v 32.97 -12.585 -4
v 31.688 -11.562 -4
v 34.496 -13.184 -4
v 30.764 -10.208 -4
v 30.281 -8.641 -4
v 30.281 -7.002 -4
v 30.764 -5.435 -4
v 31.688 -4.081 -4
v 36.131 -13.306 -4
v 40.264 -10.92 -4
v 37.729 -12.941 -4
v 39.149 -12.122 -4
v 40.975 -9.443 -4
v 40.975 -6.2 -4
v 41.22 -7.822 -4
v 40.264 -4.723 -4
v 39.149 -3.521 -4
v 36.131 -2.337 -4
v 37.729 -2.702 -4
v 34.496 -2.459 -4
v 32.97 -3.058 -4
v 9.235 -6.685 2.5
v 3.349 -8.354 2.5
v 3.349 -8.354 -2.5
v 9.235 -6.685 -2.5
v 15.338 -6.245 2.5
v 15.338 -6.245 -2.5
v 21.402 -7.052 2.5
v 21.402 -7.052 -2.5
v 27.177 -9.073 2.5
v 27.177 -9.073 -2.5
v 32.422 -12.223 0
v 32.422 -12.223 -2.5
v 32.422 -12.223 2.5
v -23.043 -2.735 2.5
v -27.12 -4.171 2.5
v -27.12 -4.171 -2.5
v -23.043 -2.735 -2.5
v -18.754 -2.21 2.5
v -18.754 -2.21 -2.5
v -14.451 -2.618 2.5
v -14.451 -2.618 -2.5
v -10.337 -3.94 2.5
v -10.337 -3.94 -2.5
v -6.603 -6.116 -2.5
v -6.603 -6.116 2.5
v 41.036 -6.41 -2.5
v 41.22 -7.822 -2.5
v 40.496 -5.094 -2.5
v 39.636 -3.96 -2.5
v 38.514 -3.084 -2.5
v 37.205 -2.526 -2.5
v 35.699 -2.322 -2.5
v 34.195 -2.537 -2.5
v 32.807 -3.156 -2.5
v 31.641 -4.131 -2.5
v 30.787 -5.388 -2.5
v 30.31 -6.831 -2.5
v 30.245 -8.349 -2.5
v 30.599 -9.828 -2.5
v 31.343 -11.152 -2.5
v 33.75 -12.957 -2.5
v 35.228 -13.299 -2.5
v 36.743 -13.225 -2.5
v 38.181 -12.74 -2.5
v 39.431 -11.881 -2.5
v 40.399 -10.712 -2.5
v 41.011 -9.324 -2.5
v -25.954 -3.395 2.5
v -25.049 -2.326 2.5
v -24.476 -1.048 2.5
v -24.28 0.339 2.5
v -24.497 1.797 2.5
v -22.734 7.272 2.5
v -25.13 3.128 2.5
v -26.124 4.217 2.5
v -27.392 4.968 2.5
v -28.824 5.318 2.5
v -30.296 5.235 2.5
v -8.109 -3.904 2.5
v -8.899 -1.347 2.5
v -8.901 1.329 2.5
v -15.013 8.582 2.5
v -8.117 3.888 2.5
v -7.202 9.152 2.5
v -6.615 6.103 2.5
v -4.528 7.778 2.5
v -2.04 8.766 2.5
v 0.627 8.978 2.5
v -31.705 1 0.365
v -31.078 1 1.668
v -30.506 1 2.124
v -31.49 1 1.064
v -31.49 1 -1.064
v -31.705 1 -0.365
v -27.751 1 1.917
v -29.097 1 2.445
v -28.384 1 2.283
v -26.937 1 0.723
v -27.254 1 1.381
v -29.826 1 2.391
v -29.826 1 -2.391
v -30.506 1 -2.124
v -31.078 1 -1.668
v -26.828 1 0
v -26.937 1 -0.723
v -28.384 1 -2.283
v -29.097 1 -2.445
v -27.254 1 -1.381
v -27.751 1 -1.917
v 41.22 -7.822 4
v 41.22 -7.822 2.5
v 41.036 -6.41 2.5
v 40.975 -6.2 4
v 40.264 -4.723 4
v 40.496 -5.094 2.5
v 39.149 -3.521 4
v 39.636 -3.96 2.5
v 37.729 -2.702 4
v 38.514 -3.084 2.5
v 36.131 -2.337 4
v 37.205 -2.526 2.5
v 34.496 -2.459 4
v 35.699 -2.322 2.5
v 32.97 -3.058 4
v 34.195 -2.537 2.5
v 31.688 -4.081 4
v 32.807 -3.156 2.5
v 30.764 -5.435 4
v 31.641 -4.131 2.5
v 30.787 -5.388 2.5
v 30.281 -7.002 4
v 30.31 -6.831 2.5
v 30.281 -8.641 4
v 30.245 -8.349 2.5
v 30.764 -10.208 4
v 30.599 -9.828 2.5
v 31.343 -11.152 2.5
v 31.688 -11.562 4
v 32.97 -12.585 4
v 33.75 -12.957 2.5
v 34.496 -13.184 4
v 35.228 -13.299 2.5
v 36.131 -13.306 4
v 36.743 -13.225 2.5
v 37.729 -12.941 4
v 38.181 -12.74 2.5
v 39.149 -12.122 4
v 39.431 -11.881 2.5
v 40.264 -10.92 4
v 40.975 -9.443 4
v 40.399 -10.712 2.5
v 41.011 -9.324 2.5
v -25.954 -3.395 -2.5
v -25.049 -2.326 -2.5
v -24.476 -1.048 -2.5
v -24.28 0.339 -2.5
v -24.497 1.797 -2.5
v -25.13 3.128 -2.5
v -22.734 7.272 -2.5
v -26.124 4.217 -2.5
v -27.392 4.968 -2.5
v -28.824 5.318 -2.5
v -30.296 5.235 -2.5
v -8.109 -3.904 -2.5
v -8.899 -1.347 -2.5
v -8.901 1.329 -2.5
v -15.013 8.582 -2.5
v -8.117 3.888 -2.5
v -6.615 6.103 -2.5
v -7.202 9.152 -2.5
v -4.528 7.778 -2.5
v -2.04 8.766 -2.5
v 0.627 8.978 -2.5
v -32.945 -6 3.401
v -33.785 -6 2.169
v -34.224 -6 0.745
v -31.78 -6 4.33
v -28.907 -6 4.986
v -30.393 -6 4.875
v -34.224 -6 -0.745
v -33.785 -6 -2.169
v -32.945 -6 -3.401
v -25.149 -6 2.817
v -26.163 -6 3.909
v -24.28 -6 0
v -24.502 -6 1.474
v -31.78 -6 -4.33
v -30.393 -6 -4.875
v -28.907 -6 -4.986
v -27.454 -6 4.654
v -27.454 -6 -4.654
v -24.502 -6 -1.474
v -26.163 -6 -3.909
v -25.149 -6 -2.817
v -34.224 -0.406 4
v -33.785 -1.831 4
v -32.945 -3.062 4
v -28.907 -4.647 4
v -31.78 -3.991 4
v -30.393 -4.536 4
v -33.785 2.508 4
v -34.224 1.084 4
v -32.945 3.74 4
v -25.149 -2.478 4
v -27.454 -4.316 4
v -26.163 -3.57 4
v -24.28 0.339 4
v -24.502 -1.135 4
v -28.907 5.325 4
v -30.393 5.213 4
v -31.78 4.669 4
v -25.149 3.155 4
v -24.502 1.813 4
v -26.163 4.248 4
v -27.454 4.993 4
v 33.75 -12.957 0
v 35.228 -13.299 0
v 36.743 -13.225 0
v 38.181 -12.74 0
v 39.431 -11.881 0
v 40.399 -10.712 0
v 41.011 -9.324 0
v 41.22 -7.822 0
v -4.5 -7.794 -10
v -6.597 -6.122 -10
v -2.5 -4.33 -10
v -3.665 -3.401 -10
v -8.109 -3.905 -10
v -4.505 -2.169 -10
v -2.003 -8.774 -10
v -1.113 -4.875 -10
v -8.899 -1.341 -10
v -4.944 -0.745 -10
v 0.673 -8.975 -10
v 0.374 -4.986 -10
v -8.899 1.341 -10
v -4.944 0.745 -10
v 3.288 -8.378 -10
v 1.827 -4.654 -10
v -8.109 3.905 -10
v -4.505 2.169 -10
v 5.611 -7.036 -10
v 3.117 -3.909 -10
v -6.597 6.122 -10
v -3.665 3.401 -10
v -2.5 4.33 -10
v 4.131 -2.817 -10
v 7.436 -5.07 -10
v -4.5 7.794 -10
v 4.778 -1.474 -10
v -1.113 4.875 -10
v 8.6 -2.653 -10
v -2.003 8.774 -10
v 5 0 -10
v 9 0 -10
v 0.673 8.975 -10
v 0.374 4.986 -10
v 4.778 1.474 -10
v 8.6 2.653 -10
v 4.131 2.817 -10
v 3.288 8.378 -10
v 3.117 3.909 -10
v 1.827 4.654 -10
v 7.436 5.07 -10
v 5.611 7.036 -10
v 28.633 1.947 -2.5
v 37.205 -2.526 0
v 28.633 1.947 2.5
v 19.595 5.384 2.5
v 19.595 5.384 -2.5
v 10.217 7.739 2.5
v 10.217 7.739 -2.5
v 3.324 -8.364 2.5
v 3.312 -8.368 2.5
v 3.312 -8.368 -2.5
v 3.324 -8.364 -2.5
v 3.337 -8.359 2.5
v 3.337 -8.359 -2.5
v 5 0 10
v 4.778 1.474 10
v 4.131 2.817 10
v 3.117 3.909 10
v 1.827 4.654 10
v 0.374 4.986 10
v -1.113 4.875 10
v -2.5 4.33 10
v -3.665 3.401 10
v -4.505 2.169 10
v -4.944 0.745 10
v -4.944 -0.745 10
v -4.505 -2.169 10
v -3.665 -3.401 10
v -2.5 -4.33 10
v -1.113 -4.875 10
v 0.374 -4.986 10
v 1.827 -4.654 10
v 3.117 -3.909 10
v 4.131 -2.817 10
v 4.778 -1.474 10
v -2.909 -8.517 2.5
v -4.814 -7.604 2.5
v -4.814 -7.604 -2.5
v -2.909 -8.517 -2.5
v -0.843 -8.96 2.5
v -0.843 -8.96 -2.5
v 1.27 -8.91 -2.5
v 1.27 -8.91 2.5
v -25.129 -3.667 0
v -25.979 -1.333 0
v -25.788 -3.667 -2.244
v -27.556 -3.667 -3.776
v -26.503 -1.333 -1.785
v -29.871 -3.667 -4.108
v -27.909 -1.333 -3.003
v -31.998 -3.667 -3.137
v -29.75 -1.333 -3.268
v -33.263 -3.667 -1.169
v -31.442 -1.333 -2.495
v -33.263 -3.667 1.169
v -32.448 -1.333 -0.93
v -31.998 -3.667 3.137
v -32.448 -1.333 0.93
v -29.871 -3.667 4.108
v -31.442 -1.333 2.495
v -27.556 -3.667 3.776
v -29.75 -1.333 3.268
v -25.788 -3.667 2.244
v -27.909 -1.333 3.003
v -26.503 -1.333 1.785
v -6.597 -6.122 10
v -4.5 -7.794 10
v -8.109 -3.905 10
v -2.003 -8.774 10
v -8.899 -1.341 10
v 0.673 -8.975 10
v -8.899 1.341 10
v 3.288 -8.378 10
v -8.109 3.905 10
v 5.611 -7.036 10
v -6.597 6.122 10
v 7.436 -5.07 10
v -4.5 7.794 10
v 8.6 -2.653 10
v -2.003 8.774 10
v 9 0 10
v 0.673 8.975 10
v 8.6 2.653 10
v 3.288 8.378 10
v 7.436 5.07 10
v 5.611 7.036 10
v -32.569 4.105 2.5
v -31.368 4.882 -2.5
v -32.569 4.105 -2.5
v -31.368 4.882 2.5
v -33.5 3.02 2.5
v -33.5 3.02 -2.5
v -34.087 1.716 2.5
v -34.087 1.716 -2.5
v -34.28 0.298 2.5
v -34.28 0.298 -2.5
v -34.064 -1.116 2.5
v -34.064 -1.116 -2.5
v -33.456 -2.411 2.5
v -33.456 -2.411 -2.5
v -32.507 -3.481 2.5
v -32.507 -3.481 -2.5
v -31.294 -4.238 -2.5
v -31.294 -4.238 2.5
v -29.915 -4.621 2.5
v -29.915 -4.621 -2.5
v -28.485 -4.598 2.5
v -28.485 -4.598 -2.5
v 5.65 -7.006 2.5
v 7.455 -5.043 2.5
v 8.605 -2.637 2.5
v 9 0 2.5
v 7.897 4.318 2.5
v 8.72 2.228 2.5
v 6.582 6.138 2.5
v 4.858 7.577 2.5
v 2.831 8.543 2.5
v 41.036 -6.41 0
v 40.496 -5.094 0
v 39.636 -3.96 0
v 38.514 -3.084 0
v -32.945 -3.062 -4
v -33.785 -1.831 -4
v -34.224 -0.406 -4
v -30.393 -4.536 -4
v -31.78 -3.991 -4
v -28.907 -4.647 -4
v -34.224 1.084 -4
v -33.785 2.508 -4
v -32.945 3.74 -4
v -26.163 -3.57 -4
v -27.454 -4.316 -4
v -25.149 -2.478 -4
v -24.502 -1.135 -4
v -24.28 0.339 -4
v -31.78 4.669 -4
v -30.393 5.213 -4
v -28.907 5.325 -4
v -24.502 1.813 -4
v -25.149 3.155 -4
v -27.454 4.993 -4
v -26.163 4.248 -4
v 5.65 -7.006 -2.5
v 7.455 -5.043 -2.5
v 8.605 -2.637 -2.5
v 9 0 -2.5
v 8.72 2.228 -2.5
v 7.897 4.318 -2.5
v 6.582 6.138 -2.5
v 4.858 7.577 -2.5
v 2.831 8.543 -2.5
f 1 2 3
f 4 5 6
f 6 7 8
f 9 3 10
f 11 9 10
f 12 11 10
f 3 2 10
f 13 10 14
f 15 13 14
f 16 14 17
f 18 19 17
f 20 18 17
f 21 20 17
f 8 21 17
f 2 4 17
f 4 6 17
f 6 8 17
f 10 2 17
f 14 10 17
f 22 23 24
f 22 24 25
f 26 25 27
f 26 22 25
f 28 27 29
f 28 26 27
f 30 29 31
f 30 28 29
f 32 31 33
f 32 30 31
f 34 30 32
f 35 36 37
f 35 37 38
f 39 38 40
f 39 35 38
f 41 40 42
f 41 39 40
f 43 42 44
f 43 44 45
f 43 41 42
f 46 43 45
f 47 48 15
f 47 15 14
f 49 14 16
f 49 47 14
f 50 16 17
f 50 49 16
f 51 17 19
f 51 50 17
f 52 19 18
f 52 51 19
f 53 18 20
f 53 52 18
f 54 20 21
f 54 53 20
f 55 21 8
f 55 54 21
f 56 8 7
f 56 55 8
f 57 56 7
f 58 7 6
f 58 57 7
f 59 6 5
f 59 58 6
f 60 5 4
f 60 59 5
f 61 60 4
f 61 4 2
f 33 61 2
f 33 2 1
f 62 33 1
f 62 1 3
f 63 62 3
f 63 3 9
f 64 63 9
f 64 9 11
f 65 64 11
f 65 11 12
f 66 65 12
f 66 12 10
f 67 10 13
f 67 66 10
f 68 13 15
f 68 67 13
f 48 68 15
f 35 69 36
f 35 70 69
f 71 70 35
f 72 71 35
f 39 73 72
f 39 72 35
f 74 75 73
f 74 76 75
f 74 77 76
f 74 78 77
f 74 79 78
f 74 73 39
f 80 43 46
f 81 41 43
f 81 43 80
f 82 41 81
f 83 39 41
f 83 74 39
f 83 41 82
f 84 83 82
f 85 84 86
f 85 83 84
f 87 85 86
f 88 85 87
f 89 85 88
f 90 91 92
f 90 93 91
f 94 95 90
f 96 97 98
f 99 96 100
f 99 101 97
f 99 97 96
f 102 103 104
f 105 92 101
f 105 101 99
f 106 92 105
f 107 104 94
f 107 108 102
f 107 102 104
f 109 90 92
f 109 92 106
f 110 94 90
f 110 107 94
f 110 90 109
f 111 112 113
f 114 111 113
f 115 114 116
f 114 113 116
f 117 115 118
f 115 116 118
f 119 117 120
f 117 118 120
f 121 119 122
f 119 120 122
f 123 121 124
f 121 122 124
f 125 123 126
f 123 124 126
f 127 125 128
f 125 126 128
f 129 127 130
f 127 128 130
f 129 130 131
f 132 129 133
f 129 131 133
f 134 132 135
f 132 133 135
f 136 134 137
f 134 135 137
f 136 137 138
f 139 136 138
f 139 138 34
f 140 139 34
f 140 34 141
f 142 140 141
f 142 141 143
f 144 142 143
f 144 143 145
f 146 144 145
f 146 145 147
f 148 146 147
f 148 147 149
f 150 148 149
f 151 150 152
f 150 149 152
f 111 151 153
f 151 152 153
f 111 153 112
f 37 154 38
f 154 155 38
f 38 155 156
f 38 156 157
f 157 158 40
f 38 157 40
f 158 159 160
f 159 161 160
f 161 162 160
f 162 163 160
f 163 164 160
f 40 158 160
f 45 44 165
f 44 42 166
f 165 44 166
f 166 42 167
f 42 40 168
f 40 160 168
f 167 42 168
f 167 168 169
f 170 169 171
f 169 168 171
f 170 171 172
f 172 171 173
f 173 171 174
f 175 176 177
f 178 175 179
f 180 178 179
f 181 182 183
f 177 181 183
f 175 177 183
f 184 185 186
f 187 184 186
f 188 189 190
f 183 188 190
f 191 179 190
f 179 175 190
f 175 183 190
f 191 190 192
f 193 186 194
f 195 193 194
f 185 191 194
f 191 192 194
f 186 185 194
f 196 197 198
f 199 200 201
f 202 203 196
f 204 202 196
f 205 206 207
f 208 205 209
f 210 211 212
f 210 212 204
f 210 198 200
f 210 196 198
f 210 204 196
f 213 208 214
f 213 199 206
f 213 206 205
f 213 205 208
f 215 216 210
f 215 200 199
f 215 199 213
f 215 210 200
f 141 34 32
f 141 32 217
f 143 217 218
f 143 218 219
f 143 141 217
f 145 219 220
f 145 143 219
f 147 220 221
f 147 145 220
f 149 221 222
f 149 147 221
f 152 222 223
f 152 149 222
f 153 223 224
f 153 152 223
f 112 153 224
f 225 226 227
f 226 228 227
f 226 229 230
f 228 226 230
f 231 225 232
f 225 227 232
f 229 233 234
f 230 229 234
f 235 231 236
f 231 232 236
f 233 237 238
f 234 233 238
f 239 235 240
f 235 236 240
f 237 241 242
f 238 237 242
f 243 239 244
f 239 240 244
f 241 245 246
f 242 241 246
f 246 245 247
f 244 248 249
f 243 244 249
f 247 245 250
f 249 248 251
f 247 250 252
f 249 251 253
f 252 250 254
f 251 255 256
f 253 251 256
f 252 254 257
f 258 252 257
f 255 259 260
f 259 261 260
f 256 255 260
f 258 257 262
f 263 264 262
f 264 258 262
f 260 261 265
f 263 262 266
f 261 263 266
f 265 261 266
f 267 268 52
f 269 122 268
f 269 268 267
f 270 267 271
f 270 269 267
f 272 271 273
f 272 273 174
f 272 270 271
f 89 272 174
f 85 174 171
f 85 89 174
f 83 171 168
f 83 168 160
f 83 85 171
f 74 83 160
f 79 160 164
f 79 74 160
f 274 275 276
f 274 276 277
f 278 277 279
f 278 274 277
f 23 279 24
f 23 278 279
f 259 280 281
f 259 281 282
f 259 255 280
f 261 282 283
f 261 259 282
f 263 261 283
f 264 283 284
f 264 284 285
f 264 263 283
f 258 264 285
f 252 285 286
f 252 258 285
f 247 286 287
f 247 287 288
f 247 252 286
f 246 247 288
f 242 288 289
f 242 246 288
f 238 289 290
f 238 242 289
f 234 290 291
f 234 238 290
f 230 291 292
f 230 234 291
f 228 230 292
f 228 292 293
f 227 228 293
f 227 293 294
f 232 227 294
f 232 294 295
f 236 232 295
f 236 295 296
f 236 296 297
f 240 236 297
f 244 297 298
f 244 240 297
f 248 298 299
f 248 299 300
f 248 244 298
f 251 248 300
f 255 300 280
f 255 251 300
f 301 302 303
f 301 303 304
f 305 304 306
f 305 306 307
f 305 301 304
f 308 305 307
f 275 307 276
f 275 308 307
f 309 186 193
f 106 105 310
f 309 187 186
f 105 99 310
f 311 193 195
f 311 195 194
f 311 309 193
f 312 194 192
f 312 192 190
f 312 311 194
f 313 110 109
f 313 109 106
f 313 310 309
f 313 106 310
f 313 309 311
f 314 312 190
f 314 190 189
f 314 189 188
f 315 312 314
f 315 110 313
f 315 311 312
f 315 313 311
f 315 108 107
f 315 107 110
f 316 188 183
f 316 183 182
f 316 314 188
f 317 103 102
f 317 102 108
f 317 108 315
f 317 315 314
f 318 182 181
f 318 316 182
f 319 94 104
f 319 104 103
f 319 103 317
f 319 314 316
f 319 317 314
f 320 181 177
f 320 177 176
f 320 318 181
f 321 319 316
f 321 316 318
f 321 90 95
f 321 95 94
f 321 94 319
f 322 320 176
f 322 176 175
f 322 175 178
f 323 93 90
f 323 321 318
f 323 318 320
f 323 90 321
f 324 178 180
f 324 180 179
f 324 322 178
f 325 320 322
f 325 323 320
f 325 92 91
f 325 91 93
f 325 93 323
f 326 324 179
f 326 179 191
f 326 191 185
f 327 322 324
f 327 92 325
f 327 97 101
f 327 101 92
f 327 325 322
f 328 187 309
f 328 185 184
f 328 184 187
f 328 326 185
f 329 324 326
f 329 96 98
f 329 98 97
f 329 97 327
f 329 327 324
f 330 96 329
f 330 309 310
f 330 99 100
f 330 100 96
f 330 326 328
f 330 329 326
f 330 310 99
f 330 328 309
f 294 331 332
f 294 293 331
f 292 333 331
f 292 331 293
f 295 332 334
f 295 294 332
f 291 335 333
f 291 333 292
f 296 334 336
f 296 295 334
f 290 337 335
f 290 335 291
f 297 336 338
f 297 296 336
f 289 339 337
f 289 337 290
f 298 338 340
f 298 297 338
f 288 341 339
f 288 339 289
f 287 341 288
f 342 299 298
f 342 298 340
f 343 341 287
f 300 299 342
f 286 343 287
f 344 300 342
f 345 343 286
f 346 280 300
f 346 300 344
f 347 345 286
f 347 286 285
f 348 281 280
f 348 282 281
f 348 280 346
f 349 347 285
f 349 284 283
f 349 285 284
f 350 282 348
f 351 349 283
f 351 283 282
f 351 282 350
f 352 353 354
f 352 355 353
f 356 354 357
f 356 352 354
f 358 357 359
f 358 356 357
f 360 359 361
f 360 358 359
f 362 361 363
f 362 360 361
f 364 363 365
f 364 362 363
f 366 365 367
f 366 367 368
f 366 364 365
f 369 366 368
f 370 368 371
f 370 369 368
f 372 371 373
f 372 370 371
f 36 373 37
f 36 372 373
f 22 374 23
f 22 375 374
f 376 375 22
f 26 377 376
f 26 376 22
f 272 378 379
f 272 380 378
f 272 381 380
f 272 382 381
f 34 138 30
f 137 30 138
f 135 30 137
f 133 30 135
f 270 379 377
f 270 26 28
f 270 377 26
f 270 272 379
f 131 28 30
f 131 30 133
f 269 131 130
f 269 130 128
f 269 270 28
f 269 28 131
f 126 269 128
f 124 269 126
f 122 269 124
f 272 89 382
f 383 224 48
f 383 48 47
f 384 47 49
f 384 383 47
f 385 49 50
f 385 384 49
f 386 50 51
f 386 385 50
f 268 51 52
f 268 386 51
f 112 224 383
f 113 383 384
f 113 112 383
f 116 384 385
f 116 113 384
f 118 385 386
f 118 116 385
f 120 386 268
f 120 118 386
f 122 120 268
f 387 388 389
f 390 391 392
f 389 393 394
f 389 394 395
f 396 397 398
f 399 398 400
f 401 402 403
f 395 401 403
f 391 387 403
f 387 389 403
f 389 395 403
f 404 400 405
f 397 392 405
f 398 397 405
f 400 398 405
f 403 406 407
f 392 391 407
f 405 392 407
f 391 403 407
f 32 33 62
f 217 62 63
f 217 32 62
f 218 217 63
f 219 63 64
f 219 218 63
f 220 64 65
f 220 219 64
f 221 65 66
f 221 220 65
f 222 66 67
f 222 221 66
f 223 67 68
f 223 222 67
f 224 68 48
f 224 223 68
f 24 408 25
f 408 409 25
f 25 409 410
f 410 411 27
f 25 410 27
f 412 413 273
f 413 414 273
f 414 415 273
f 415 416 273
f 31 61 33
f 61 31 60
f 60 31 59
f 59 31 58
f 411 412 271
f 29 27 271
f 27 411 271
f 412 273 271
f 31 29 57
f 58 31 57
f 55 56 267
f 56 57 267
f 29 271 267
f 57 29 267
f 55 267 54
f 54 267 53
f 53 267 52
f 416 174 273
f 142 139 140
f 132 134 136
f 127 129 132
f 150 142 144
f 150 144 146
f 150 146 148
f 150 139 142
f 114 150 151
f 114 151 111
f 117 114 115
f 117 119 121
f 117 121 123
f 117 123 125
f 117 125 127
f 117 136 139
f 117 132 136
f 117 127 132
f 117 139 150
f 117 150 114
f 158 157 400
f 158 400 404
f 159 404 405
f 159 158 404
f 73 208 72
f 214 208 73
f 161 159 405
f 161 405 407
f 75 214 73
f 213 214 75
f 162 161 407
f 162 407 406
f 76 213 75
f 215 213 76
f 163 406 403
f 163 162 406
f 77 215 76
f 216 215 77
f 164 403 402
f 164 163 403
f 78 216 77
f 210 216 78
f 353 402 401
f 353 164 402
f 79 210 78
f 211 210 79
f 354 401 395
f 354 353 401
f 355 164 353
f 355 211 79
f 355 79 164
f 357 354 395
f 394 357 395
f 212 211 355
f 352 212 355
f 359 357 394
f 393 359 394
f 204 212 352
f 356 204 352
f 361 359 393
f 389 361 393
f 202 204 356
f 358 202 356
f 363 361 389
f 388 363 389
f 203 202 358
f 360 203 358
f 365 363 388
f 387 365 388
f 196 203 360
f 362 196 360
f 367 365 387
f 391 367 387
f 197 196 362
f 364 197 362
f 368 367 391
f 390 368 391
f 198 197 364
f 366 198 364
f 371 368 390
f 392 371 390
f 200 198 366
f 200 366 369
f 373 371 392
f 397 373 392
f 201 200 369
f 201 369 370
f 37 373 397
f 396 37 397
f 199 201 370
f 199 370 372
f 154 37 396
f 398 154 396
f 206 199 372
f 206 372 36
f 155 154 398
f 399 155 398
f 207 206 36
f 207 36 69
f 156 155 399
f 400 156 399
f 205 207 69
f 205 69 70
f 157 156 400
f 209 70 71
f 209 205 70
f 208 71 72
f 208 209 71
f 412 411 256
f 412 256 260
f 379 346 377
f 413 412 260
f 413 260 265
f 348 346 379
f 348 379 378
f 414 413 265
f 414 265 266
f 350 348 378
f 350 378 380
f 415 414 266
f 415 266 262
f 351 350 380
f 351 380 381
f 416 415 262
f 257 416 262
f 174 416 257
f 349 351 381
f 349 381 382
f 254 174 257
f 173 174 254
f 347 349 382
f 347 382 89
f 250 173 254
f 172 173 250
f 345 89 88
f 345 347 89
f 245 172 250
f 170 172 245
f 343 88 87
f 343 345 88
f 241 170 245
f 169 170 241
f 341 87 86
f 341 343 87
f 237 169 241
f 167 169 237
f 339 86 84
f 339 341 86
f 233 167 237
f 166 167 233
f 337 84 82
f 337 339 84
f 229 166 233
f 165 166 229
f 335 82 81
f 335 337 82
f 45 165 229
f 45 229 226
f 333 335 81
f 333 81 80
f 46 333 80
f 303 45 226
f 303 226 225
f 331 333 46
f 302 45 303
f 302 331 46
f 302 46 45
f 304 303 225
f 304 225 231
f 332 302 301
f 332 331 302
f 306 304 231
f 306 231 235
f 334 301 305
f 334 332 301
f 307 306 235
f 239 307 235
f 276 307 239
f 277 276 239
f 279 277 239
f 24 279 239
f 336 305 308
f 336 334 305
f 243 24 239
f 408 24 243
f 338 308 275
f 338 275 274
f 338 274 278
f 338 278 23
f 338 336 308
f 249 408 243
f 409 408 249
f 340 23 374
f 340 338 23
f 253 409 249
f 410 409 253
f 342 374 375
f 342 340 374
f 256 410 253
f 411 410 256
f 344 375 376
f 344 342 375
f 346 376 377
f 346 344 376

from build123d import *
from build123d.topology import SkipClean

# Parameters (mm, degrees)
SKETCH1_R           = 5
BOSS_EXTRUDE1_DEPTH = 2.5
SKETCH2_R           = 9
SKETCH2_R_2         = 5
BOSS_EXTRUDE2_DEPTH = 10
SKETCH3_R           = 5.5
SKETCH3_R_2         = 5
BOSS_EXTRUDE3_DEPTH = 4
SKETCH4_R           = 5
BOSS_EXTRUDE4_DEPTH = 7
BOSS_EXTRUDE4_TAPER = 20


with BuildPart() as part:
    # Sketch1 → Boss-Extrude1 (new, symmetric)
    with BuildSketch(Plane.XY):
        with BuildLine():
            ThreePointArc((-27.120047812, -4.170528509), (-16.591401211, -2.297007262), (-6.602547196, -6.116074764))
            ThreePointArc((-6.602547196, -6.116074764), (-5.686754999, -6.834078204), (-4.814272463, -7.604129184))
            ThreePointArc((-4.814272463, -7.604129184), (-0.842725747, -8.960458321), (3.312065045, -8.368406368))
            ThreePointArc((3.312065045, -8.368406368), (3.330616558, -8.361040207), (3.349151688, -8.35363292))
            ThreePointArc((3.349151688, -8.35363292), (18.390548307, -6.493374736), (32.421785807, -12.222994876))
            ThreePointArc((32.421785807, -12.222994876), (40.652322357, -10.254634895), (37.205207776, -2.525885063))
            ThreePointArc((37.205207776, -2.525885063), (4.292412816, 8.639526929), (-30.295517409, 5.234592316))
            ThreePointArc((-30.295517409, 5.234592316), (-30.83213572, 5.060242912), (-31.367547013, 4.882221361))
            ThreePointArc((-31.367547013, 4.882221361), (-33.806729375, -1.785055526), (-27.120047812, -4.170528509))
        make_face()
        Circle(SKETCH1_R, mode=Mode.SUBTRACT)
    extrude(amount=BOSS_EXTRUDE1_DEPTH, both=True)

    # Sketch2 → Boss-Extrude2 (add, symmetric)
    with BuildSketch(Plane.XY):
        Circle(SKETCH2_R)
        Circle(SKETCH2_R_2, mode=Mode.SUBTRACT)
    extrude(amount=BOSS_EXTRUDE2_DEPTH, both=True)

    # Sketch3 → Boss-Extrude3 (add, symmetric)
    with SkipClean():  # the faces are left unmerged after this step: merging them gives an invalid solid
        with BuildSketch(Plane.XY):
            with Locations((35.719792003, -7.821500228)):
                Circle(SKETCH3_R)
            with Locations((-29.280207997, 0.338762785)):
                Circle(SKETCH3_R_2)
        extrude(amount=BOSS_EXTRUDE3_DEPTH, both=True)


with BuildPart() as body_2:
    # Sketch4 → Boss-Extrude4 (new body)
    with BuildSketch(Plane(origin=(0, -6, 0), x_dir=(1, 0, 0), z_dir=(0, 1, 0))):
        with Locations((-29.280207997, 0)):
            Circle(SKETCH4_R)
    extrude(amount=BOSS_EXTRUDE4_DEPTH, taper=BOSS_EXTRUDE4_TAPER)


solid = Compound([part.part, body_2.part])
